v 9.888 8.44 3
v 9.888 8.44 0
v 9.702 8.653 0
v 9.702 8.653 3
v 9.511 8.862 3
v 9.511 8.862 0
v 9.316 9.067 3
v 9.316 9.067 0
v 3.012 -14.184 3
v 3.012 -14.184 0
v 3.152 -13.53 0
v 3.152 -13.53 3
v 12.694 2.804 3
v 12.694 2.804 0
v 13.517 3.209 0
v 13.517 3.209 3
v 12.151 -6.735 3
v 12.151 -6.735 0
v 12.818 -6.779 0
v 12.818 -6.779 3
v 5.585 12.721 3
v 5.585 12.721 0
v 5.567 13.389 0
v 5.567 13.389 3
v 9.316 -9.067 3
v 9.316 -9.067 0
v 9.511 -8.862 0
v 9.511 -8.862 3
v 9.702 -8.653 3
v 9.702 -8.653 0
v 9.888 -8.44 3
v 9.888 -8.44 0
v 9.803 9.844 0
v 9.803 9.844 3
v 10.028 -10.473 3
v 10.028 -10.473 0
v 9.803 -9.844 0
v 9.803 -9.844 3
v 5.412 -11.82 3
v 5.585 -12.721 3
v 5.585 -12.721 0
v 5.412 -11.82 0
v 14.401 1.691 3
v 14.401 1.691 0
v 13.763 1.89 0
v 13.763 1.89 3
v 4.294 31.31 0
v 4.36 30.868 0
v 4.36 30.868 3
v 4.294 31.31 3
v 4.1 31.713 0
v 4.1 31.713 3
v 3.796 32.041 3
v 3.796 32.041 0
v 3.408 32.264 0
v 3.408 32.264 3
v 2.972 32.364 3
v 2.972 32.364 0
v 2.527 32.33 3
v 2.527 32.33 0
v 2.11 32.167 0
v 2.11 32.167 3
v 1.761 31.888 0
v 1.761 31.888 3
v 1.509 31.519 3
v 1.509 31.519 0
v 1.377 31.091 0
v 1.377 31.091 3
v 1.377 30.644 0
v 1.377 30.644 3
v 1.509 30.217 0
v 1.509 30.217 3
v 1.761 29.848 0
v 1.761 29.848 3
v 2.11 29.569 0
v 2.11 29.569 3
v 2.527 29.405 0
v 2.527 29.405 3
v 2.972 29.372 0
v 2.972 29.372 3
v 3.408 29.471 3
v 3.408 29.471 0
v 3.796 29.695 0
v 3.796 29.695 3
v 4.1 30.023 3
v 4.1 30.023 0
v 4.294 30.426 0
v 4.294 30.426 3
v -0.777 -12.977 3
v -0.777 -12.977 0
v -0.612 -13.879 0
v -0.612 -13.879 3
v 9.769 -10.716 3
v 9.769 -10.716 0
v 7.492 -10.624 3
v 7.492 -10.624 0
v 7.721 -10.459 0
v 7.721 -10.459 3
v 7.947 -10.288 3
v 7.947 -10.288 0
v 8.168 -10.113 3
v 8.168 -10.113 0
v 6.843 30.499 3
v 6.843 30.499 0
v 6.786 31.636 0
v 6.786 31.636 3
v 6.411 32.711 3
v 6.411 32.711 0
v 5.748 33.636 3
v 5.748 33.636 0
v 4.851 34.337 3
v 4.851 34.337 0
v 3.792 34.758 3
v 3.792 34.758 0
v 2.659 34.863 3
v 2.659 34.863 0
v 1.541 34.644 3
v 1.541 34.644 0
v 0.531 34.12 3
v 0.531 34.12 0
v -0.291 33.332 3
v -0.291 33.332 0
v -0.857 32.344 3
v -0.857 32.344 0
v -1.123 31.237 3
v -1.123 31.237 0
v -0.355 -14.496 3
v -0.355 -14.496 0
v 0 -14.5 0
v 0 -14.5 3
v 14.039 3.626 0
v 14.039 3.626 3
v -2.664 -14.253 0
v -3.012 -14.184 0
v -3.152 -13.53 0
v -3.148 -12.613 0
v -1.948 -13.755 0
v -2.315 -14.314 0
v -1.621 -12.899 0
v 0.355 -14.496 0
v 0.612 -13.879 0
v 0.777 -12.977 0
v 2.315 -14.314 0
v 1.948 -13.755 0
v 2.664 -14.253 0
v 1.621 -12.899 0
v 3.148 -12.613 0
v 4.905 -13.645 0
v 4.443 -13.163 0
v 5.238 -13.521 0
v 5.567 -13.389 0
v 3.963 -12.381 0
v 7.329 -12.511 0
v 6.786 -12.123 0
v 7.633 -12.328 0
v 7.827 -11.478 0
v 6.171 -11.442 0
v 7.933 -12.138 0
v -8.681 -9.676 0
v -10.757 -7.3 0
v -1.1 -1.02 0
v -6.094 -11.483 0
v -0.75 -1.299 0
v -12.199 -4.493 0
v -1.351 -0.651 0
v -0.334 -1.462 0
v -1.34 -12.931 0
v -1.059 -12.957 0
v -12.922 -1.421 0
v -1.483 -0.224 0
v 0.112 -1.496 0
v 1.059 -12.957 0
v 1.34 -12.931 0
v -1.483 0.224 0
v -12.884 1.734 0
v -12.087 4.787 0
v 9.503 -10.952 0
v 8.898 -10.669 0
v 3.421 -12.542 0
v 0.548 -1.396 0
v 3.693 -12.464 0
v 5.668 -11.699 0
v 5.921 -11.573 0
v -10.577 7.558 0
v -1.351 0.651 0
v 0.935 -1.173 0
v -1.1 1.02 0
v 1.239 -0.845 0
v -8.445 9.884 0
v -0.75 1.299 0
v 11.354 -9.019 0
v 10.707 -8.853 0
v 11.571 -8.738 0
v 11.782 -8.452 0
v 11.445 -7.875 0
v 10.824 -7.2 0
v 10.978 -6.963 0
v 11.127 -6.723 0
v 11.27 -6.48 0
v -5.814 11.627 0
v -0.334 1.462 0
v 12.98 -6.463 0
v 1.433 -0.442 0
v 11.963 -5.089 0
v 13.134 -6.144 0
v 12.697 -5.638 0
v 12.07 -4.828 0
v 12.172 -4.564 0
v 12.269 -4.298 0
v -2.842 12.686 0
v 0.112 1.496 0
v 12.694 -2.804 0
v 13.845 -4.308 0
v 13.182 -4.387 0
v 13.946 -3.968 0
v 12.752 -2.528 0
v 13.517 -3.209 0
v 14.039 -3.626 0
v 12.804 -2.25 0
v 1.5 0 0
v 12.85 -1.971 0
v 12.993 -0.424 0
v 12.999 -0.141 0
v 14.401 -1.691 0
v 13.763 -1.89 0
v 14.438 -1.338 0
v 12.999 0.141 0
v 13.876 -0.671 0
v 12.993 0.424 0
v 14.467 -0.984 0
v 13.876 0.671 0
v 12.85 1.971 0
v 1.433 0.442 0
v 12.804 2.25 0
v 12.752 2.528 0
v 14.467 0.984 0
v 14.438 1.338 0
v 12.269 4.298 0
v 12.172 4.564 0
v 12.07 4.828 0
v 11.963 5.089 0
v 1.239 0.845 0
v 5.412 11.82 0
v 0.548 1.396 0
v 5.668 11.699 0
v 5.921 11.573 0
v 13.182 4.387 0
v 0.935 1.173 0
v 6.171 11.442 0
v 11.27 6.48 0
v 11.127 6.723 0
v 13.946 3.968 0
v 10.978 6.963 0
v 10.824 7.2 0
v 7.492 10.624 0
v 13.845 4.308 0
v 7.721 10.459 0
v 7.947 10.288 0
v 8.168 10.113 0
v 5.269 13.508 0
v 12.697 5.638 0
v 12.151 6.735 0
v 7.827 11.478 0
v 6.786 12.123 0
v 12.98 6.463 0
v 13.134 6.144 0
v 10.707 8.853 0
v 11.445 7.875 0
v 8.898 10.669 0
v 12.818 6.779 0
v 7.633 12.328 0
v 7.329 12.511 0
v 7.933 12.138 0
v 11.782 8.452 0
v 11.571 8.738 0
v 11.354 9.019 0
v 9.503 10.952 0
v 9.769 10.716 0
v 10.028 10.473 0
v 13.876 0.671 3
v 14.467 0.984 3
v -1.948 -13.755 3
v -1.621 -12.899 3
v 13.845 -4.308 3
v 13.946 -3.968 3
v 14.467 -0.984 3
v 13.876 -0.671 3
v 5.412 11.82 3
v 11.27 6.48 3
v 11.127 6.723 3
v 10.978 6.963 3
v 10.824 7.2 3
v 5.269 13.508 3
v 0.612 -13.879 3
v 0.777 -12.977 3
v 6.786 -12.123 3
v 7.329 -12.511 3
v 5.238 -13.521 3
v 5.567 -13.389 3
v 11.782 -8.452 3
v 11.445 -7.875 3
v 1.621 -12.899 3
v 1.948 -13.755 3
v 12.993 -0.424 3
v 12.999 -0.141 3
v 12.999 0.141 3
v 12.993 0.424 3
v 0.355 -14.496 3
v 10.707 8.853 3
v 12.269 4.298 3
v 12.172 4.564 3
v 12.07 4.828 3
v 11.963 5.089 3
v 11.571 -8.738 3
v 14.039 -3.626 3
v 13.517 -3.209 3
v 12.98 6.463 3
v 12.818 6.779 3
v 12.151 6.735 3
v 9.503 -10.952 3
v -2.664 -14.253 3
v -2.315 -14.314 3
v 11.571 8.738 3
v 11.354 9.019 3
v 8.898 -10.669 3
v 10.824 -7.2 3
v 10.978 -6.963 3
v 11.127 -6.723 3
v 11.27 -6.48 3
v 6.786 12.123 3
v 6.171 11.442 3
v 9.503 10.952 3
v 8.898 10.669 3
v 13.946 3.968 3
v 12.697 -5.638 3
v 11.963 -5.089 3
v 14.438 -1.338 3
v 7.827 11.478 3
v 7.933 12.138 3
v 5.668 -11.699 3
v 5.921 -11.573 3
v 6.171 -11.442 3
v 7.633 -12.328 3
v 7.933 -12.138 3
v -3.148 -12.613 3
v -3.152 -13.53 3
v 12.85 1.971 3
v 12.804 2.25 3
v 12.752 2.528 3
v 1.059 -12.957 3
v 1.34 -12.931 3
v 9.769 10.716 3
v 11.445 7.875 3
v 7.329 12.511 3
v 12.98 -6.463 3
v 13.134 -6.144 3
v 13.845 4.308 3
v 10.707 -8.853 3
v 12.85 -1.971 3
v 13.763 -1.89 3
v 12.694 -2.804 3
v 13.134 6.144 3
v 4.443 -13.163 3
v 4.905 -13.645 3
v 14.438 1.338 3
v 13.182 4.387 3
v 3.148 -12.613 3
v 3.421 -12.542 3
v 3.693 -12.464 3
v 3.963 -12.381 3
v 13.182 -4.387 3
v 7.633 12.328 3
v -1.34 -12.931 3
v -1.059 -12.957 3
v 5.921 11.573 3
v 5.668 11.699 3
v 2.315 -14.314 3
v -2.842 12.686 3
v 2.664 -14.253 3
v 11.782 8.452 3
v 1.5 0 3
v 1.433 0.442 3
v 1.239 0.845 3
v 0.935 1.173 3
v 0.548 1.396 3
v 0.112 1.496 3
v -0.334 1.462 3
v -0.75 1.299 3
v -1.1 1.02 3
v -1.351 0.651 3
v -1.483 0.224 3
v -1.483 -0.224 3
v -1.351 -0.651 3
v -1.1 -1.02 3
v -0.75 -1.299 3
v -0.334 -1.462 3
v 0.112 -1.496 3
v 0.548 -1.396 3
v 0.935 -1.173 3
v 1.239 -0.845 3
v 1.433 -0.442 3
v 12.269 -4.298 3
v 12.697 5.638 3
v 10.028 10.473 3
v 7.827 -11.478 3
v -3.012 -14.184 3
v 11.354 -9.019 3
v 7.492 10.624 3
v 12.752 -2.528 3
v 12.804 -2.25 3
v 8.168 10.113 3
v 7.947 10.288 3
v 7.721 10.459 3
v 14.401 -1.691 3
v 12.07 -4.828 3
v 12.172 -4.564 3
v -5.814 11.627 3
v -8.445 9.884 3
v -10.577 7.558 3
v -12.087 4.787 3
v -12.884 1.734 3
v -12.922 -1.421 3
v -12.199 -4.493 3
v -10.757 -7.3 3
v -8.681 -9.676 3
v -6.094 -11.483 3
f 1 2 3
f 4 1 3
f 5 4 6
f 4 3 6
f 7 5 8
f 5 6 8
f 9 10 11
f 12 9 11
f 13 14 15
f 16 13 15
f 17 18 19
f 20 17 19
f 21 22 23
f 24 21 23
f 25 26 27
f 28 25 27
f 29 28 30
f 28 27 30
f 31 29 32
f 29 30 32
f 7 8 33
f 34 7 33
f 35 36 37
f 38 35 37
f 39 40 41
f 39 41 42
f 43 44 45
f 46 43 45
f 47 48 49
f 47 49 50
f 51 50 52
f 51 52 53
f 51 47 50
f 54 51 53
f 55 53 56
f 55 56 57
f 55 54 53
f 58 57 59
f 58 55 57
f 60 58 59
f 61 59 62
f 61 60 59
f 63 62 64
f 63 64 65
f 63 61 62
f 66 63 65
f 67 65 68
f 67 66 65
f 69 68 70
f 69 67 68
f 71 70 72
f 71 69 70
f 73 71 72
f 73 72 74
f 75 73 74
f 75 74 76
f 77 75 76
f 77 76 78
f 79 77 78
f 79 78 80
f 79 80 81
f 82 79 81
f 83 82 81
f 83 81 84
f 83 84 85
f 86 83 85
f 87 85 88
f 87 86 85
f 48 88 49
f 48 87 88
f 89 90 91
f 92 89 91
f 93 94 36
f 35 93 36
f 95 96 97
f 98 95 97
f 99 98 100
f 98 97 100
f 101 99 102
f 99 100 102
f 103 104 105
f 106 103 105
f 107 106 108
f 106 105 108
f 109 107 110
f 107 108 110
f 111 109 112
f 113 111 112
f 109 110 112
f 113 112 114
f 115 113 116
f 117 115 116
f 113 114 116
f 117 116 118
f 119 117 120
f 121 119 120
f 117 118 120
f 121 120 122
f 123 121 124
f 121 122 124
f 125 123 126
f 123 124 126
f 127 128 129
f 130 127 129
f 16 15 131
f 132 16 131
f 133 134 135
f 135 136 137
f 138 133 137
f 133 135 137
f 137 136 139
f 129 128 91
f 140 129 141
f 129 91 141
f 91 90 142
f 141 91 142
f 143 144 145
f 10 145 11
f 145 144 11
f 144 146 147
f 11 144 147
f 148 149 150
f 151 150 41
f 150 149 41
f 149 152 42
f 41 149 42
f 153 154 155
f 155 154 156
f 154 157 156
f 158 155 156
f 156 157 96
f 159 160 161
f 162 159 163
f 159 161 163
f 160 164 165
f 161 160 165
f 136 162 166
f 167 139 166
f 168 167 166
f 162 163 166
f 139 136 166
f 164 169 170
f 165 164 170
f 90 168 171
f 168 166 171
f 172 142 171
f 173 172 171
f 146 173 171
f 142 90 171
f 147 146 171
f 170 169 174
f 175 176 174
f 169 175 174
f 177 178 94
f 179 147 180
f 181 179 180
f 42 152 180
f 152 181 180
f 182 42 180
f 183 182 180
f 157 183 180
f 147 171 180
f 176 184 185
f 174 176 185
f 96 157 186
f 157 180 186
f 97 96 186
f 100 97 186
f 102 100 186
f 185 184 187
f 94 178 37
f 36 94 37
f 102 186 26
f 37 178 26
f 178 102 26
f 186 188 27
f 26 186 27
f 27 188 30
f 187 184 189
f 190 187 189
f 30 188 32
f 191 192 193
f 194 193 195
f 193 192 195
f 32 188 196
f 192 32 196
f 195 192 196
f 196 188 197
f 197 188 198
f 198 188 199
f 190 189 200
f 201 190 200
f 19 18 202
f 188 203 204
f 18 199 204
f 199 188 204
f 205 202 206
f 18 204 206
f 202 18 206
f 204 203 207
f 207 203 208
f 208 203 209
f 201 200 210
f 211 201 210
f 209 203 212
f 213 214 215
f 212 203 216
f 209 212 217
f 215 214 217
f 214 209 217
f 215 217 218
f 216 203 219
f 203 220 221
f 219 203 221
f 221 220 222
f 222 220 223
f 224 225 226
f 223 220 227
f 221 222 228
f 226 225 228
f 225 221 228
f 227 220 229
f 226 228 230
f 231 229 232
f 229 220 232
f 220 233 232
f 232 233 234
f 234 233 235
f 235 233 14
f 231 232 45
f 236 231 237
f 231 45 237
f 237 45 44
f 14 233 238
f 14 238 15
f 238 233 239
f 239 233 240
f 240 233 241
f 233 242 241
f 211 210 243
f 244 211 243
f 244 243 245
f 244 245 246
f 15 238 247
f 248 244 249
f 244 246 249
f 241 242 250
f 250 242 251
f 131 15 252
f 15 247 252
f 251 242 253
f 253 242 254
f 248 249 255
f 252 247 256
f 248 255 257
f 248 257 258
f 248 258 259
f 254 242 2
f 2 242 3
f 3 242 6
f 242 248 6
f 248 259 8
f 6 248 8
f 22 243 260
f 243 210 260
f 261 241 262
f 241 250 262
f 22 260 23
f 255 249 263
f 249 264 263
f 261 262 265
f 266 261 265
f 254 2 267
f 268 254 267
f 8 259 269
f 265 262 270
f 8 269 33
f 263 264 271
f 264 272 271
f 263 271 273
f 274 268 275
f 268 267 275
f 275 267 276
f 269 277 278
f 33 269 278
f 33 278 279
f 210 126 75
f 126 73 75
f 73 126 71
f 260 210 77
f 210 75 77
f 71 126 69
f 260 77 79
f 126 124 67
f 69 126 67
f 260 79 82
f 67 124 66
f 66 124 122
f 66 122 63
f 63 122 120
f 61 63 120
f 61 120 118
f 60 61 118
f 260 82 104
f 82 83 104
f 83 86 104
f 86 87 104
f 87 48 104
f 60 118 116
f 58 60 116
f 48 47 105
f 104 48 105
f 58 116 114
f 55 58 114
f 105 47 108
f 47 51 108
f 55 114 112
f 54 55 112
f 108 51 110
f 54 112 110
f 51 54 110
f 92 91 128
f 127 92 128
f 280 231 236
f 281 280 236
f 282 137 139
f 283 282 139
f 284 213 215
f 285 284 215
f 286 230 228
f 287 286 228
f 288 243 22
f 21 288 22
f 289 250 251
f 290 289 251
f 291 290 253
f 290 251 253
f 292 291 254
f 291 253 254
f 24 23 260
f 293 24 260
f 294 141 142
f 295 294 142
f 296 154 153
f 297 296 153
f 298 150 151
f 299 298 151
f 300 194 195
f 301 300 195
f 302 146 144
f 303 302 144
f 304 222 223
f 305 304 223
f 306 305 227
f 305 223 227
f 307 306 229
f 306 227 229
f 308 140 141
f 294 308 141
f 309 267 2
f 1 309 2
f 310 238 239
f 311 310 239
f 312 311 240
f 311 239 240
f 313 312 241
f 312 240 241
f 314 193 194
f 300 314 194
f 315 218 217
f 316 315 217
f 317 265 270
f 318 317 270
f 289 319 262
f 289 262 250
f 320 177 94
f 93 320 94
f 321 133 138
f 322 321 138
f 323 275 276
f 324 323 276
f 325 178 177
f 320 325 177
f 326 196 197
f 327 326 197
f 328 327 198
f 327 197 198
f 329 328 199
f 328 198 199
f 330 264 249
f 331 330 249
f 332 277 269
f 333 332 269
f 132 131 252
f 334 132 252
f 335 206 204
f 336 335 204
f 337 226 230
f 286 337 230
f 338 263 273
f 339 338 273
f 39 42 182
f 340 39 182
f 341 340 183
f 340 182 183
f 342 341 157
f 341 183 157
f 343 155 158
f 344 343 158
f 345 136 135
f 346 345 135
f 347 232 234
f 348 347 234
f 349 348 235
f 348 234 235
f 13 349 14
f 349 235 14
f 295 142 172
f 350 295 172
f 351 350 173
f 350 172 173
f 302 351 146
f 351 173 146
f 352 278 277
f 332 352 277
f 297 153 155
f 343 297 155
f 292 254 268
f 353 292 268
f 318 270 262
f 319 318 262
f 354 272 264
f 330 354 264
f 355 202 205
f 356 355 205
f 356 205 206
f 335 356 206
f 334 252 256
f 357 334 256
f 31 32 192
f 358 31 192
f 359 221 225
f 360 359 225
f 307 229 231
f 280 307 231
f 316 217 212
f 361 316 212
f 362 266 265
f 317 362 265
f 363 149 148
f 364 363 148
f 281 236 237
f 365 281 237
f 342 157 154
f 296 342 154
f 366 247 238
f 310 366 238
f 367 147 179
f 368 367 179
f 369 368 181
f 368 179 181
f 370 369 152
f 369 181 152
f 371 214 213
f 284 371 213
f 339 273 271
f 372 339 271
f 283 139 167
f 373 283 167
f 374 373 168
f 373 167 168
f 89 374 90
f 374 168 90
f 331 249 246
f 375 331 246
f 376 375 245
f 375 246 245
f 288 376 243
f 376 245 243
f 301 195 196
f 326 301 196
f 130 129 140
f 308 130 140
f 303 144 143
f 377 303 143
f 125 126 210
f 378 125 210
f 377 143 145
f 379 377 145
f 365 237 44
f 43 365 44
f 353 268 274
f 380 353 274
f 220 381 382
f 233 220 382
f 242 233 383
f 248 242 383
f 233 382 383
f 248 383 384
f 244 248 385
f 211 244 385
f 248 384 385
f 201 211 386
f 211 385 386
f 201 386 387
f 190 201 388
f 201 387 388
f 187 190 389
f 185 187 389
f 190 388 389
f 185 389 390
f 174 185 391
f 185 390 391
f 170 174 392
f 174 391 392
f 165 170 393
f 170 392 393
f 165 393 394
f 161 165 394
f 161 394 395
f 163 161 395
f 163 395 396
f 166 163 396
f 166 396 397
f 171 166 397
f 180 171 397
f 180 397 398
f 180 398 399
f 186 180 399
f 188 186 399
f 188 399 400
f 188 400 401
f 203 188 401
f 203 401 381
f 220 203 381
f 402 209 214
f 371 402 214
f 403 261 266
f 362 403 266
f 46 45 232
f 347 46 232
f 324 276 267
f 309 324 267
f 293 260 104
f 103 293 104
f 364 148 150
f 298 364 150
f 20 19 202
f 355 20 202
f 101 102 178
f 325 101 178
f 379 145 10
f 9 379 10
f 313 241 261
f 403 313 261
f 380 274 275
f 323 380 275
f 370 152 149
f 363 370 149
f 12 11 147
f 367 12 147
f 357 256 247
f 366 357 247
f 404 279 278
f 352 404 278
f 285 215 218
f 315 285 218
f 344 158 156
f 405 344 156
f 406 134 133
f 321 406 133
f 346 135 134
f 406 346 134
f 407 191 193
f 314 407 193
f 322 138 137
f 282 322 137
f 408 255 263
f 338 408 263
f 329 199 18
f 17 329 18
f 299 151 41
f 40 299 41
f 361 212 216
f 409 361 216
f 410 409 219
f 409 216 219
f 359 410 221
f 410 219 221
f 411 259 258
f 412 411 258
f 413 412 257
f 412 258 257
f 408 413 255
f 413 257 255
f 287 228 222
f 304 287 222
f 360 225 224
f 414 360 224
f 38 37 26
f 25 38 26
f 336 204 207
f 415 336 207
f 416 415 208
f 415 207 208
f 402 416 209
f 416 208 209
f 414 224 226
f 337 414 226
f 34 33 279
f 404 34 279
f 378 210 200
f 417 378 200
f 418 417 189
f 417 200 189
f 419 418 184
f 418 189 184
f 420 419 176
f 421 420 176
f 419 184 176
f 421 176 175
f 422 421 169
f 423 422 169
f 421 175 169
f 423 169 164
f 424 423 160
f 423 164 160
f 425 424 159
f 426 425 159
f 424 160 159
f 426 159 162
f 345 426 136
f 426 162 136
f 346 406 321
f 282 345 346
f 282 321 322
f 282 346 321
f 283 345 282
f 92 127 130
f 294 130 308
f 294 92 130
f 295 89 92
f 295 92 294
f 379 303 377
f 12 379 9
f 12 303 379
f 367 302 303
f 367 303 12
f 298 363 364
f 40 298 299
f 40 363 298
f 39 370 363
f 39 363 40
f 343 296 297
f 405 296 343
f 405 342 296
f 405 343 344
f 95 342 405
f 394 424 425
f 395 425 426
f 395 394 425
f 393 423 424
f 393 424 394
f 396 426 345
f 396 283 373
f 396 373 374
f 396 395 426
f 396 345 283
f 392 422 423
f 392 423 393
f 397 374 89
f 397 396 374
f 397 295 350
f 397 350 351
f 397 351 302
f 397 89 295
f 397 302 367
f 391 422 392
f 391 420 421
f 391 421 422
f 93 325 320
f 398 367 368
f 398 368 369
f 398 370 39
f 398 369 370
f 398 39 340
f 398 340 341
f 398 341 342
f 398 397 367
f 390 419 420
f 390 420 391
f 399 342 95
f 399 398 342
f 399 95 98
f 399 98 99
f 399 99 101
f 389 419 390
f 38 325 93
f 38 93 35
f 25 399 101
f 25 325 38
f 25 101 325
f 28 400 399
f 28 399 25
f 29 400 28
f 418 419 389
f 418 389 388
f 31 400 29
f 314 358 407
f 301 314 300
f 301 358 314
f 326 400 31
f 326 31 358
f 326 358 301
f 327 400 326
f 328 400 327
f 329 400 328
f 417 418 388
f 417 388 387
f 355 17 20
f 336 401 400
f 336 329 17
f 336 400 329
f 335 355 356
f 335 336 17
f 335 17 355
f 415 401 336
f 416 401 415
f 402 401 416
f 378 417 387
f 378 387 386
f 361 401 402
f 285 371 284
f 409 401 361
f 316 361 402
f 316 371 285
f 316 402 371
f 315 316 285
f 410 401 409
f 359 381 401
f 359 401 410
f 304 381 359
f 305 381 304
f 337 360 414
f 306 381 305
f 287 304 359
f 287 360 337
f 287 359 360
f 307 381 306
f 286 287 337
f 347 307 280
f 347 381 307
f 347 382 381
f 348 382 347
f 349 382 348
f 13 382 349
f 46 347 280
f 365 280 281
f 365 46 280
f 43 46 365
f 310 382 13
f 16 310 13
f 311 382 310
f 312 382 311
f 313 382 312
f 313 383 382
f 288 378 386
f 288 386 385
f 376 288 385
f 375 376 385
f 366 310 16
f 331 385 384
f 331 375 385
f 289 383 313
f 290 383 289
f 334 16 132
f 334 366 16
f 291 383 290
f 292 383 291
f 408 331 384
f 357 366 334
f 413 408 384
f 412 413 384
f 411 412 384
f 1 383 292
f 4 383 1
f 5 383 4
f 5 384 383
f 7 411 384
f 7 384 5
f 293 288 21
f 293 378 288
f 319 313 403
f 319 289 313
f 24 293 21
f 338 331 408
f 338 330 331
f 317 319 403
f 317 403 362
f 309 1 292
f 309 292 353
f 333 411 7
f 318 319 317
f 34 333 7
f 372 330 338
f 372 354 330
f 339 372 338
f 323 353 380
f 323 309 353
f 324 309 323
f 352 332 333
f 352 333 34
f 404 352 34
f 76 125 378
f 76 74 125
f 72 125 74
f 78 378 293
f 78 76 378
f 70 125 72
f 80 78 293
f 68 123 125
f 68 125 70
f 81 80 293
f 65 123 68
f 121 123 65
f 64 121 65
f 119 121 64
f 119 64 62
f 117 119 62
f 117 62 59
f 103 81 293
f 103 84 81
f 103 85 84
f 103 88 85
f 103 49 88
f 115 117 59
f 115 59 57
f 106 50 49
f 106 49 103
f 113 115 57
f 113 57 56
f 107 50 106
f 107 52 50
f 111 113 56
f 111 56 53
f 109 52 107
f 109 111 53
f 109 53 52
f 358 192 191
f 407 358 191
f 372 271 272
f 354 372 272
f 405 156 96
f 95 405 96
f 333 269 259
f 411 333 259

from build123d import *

# Parameters (mm, degrees)
BOSS_EXTRUDE1_DEPTH = 3
SKETCH2_R           = 1.5
CUT_EXTRUDE1_DEPTH  = 7
BOSS_EXTRUDE4_START = -3
SKETCH4_R           = 1.5
BOSS_EXTRUDE4_DEPTH = 3


with BuildPart() as part:
    # Sketch1 → Boss-Extrude1 (new body)
    with BuildSketch(Plane.XY):
        with BuildLine():
            Line((-0.612376666, 13.878994029), (-0.776800125, 12.976770845))
            ThreePointArc((-0.776800125, 12.976770845), (-12.944544292, 1.199488673), (-3.148049012, -12.613080013))
            Line((-3.148049012, -12.613080013), (-3.15220825, -13.530153864))
            Line((-3.15220825, -13.530153864), (-3.012443123, -14.183623882))
            Line((-3.012443123, -14.183623882), (-2.664368008, -14.253109945))
            Line((-2.664368008, -14.253109945), (-2.314696368, -14.314055356))
            Line((-2.314696368, -14.314055356), (-1.948308671, -13.755201698))
            Line((-1.948308671, -13.755201698), (-1.620901759, -12.89855331))
            ThreePointArc((-1.620901759, -12.89855331), (-1.199488673, -12.944544292), (-0.776800125, -12.976770845))
            Line((-0.776800125, -12.976770845), (-0.612376666, -13.878994029))
            Line((-0.612376666, -13.878994029), (-0.354916505, -14.495655703))
            Line((-0.354916505, -14.495655703), (0, -14.5))
            Line((0, -14.5), (0.354916505, -14.495655703))
            Line((0.354916505, -14.495655703), (0.612376666, -13.878994029))
            Line((0.612376666, -13.878994029), (0.776800125, -12.976770845))
            ThreePointArc((0.776800125, -12.976770845), (1.199488673, -12.944544292), (1.620901759, -12.89855331))
            Line((1.620901759, -12.89855331), (1.948308671, -13.755201698))
            Line((1.948308671, -13.755201698), (2.314696368, -14.314055356))
            Line((2.314696368, -14.314055356), (2.664368008, -14.253109945))
            Line((2.664368008, -14.253109945), (3.012443123, -14.183623882))
            Line((3.012443123, -14.183623882), (3.15220825, -13.530153864))
            Line((3.15220825, -13.530153864), (3.148049012, -12.613080013))
            ThreePointArc((3.148049012, -12.613080013), (3.557618871, -12.503733361), (3.963405777, -12.381091012))
            Line((3.963405777, -12.381091012), (4.442646693, -13.162992471))
            Line((4.442646693, -13.162992471), (4.905485034, -13.64500702))
            Line((4.905485034, -13.64500702), (5.23800416, -13.520847326))
            Line((5.23800416, -13.520847326), (5.567384604, -13.388585761))
            Line((5.567384604, -13.388585761), (5.584695163, -12.720560537))
            Line((5.584695163, -12.720560537), (5.412094866, -11.819865869))
            ThreePointArc((5.412094866, -11.819865869), (5.794598625, -11.637122788), (6.170940766, -11.442005509))
            Line((6.170940766, -11.442005509), (6.78569571, -12.122533323))
            Line((6.78569571, -12.122533323), (7.32922329, -12.511294336))
            Line((7.32922329, -12.511294336), (7.633266362, -12.328148468))
            Line((7.633266362, -12.328148468), (7.932735479, -12.137615409))
            Line((7.932735479, -12.137615409), (7.82700198, -11.477783777))
            Line((7.82700198, -11.477783777), (7.491838321, -10.624140369))
            ThreePointArc((7.491838321, -10.624140369), (7.834250273, -10.374223955), (8.168331768, -10.113276232))
            Line((8.168331768, -10.113276232), (8.897665999, -10.669255841))
            Line((8.897665999, -10.669255841), (9.503373637, -10.951524529))
            Line((9.503373637, -10.951524529), (9.768586833, -10.7156293))
            Line((9.768586833, -10.7156293), (10.027946562, -10.473313122))
            Line((10.027946562, -10.473313122), (9.802769632, -9.844144857))
            Line((9.802769632, -9.844144857), (9.316456206, -9.066622511))
            ThreePointArc((9.316456206, -9.066622511), (9.607115924, -8.758043367), (9.887560028, -8.440151462))
            Line((9.887560028, -8.440151462), (10.706636943, -8.852649649))
            Line((10.706636943, -8.852649649), (11.353897993, -9.01881369))
            Line((11.353897993, -9.01881369), (11.571249796, -8.738202227))
            Line((11.571249796, -8.738202227), (11.781667951, -8.452354718))
            Line((11.781667951, -8.452354718), (11.444715722, -7.875275391))
            Line((11.444715722, -7.875275391), (10.82381335, -7.200351698))
            ThreePointArc((10.82381335, -7.200351698), (11.052822764, -6.843618117), (11.27007929, -6.479607457))
            Line((11.27007929, -6.479607457), (12.151006207, -6.73457709))
            Line((12.151006207, -6.73457709), (12.81777897, -6.778977966))
            Line((12.81777897, -6.778977966), (12.979867725, -6.463206159))
            Line((12.979867725, -6.463206159), (13.134178769, -6.143561512))
            Line((13.134178769, -6.143561512), (12.696925744, -5.638222867))
            Line((12.696925744, -5.638222867), (11.962578511, -5.088881543))
            ThreePointArc((11.962578511, -5.088881543), (12.122138982, -4.69614166), (12.268809519, -4.298408191))
            Line((12.268809519, -4.298408191), (13.181587529, -4.387166586))
            Line((13.181587529, -4.387166586), (13.845165858, -4.308292279))
            Line((13.845165858, -4.308292279), (13.946471826, -3.968113356))
            Line((13.946471826, -3.968113356), (14.039420882, -3.625556687))
            Line((14.039420882, -3.625556687), (13.516757188, -3.209167425))
            Line((13.516757188, -3.209167425), (12.693972409, -2.804115631))
            ThreePointArc((12.693972409, -2.804115631), (12.778650296, -2.388743732), (12.849740155, -1.97083179))
            Line((12.849740155, -1.97083179), (13.763285697, -1.890356385))
            Line((13.763285697, -1.890356385), (14.401072228, -1.690892865))
            Line((14.401072228, -1.690892865), (14.438145556, -1.337891212))
            Line((14.438145556, -1.337891212), (14.466567355, -0.984087877))
            Line((14.466567355, -0.984087877), (13.876291677, -0.670827635))
            Line((13.876291677, -0.670827635), (12.993088302, -0.423858924))
            ThreePointArc((12.993088302, -0.423858924), (13, 0), (12.993088302, 0.423858924))
            Line((12.993088302, 0.423858924), (13.876291677, 0.670827635))
            Line((13.876291677, 0.670827635), (14.466567355, 0.984087877))
            Line((14.466567355, 0.984087877), (14.438145556, 1.337891212))
            Line((14.438145556, 1.337891212), (14.401072228, 1.690892865))
            Line((14.401072228, 1.690892865), (13.763285697, 1.890356385))
            Line((13.763285697, 1.890356385), (12.849740155, 1.97083179))
            ThreePointArc((12.849740155, 1.97083179), (12.778650296, 2.388743732), (12.693972409, 2.804115631))
            Line((12.693972409, 2.804115631), (13.516757188, 3.209167425))
            Line((13.516757188, 3.209167425), (14.039420882, 3.625556687))
            Line((14.039420882, 3.625556687), (13.946471826, 3.968113356))
            Line((13.946471826, 3.968113356), (13.845165858, 4.308292279))
            Line((13.845165858, 4.308292279), (13.181587529, 4.387166586))
            Line((13.181587529, 4.387166586), (12.268809519, 4.298408191))
            ThreePointArc((12.268809519, 4.298408191), (12.122138982, 4.69614166), (11.962578511, 5.088881543))
            Line((11.962578511, 5.088881543), (12.696925744, 5.638222867))
            Line((12.696925744, 5.638222867), (13.134178769, 6.143561512))
            Line((13.134178769, 6.143561512), (12.979867725, 6.463206159))
            Line((12.979867725, 6.463206159), (12.81777897, 6.778977966))
            Line((12.81777897, 6.778977966), (12.151006207, 6.73457709))
            Line((12.151006207, 6.73457709), (11.27007929, 6.479607457))
            ThreePointArc((11.27007929, 6.479607457), (11.052822764, 6.843618117), (10.82381335, 7.200351698))
            Line((10.82381335, 7.200351698), (11.444715722, 7.875275391))
            Line((11.444715722, 7.875275391), (11.781667951, 8.452354718))
            Line((11.781667951, 8.452354718), (11.571249796, 8.738202228))
            Line((11.571249796, 8.738202228), (11.353897993, 9.01881369))
            Line((11.353897993, 9.01881369), (10.706636943, 8.852649649))
            Line((10.706636943, 8.852649649), (9.887560028, 8.440151462))
            ThreePointArc((9.887560028, 8.440151462), (9.607115924, 8.758043367), (9.316456206, 9.066622511))
            Line((9.316456206, 9.066622511), (9.802769632, 9.844144857))
            Line((9.802769632, 9.844144857), (10.027946562, 10.473313122))
            Line((10.027946562, 10.473313122), (9.768586833, 10.7156293))
            Line((9.768586833, 10.7156293), (9.503373637, 10.951524529))
            Line((9.503373637, 10.951524529), (8.897665999, 10.669255841))
            Line((8.897665999, 10.669255841), (8.168331768, 10.113276232))
            ThreePointArc((8.168331768, 10.113276232), (7.834250273, 10.374223955), (7.491838321, 10.624140369))
            Line((7.491838321, 10.624140369), (7.82700198, 11.477783777))
            Line((7.82700198, 11.477783777), (7.932735479, 12.137615409))
            Line((7.932735479, 12.137615409), (7.633266362, 12.328148468))
            Line((7.633266362, 12.328148468), (7.32922329, 12.511294336))
            Line((7.32922329, 12.511294336), (6.78569571, 12.122533323))
            Line((6.78569571, 12.122533323), (6.170940766, 11.442005509))
            ThreePointArc((6.170940766, 11.442005509), (5.794598625, 11.637122788), (5.412094866, 11.819865869))
            Line((5.412094866, 11.819865869), (5.584695163, 12.720560537))
            Line((5.584695163, 12.720560537), (5.567384604, 13.388585761))
            Line((5.567384604, 13.388585761), (5.23800416, 13.520847326))
            Line((5.23800416, 13.520847326), (4.905485034, 13.64500702))
            Line((4.905485034, 13.64500702), (4.442646693, 13.162992471))
            Line((4.442646693, 13.162992471), (3.963405777, 12.381091012))
            ThreePointArc((3.963405777, 12.381091012), (3.557618871, 12.503733361), (3.148049012, 12.613080013))
            Line((3.148049012, 12.613080013), (3.15220825, 13.530153864))
            Line((3.15220825, 13.530153864), (3.012443123, 14.183623882))
            Line((3.012443123, 14.183623882), (2.664368008, 14.253109945))
            Line((2.664368008, 14.253109945), (2.314696368, 14.314055356))
            Line((2.314696368, 14.314055356), (1.948308671, 13.755201698))
            Line((1.948308671, 13.755201698), (1.620901759, 12.89855331))
            ThreePointArc((1.620901759, 12.89855331), (1.199488673, 12.944544292), (0.776800125, 12.976770845))
            Line((0.776800125, 12.976770845), (0.612376666, 13.878994029))
            Line((0.612376666, 13.878994029), (0.354916505, 14.495655703))
            Line((0.354916505, 14.495655703), (0, 14.5))
            Line((0, 14.5), (-0.354916505, 14.495655703))
            Line((-0.354916505, 14.495655703), (-0.612376666, 13.878994029))
        make_face()
    extrude(amount=BOSS_EXTRUDE1_DEPTH)

    # Sketch2 → Cut-Extrude1 (cut)
    with BuildSketch(Plane.XY.offset(3)):
        Circle(SKETCH2_R)
    extrude(amount=-CUT_EXTRUDE1_DEPTH, mode=Mode.SUBTRACT)

    # Sketch4 → Boss-Extrude4 (add)
    with BuildSketch(Plane.XY.offset(3).offset(BOSS_EXTRUDE4_START)):
        with BuildLine():
            Line((-1.122617562, 31.236832903), (-2.841640129, 12.68562499))
            ThreePointArc((-2.841640129, 12.68562499), (-1.815067202, 12.872666043), (-0.776800125, 12.976770845))
            Line((-0.776800125, 12.976770845), (-0.612376666, 13.878994029))
            Line((-0.612376666, 13.878994029), (-0.354916505, 14.495655703))
            Line((-0.354916505, 14.495655703), (0, 14.5))
            Line((0, 14.5), (0.354916505, 14.495655703))
            Line((0.354916505, 14.495655703), (0.612376666, 13.878994029))
            Line((0.612376666, 13.878994029), (0.776800125, 12.976770845))
            ThreePointArc((0.776800125, 12.976770845), (1.199488673, 12.944544292), (1.620901759, 12.89855331))
            Line((1.620901759, 12.89855331), (1.948308671, 13.755201698))
            Line((1.948308671, 13.755201698), (2.314696368, 14.314055356))
            Line((2.314696368, 14.314055356), (2.664368008, 14.253109945))
            Line((2.664368008, 14.253109945), (3.012443123, 14.183623882))
            Line((3.012443123, 14.183623882), (3.15220825, 13.530153864))
            Line((3.15220825, 13.530153864), (3.148049012, 12.613080013))
            ThreePointArc((3.148049012, 12.613080013), (3.557618871, 12.503733361), (3.963405777, 12.381091012))
            Line((3.963405777, 12.381091012), (4.442646693, 13.162992471))
            Line((4.442646693, 13.162992471), (4.905485034, 13.64500702))
            Line((4.905485034, 13.64500702), (5.23800416, 13.520847326))
            Line((5.23800416, 13.520847326), (5.268878609, 13.508449799))
            Line((5.268878609, 13.508449799), (6.843255849, 30.498686027))
            ThreePointArc((6.843255849, 30.498686027), (3.229392581, 34.85069617), (-1.122617562, 31.236832903))
        make_face()
        with Locations((2.860319143, 30.867759465)):
            Circle(SKETCH4_R, mode=Mode.SUBTRACT)
    extrude(amount=BOSS_EXTRUDE4_DEPTH)


solid = part.part
